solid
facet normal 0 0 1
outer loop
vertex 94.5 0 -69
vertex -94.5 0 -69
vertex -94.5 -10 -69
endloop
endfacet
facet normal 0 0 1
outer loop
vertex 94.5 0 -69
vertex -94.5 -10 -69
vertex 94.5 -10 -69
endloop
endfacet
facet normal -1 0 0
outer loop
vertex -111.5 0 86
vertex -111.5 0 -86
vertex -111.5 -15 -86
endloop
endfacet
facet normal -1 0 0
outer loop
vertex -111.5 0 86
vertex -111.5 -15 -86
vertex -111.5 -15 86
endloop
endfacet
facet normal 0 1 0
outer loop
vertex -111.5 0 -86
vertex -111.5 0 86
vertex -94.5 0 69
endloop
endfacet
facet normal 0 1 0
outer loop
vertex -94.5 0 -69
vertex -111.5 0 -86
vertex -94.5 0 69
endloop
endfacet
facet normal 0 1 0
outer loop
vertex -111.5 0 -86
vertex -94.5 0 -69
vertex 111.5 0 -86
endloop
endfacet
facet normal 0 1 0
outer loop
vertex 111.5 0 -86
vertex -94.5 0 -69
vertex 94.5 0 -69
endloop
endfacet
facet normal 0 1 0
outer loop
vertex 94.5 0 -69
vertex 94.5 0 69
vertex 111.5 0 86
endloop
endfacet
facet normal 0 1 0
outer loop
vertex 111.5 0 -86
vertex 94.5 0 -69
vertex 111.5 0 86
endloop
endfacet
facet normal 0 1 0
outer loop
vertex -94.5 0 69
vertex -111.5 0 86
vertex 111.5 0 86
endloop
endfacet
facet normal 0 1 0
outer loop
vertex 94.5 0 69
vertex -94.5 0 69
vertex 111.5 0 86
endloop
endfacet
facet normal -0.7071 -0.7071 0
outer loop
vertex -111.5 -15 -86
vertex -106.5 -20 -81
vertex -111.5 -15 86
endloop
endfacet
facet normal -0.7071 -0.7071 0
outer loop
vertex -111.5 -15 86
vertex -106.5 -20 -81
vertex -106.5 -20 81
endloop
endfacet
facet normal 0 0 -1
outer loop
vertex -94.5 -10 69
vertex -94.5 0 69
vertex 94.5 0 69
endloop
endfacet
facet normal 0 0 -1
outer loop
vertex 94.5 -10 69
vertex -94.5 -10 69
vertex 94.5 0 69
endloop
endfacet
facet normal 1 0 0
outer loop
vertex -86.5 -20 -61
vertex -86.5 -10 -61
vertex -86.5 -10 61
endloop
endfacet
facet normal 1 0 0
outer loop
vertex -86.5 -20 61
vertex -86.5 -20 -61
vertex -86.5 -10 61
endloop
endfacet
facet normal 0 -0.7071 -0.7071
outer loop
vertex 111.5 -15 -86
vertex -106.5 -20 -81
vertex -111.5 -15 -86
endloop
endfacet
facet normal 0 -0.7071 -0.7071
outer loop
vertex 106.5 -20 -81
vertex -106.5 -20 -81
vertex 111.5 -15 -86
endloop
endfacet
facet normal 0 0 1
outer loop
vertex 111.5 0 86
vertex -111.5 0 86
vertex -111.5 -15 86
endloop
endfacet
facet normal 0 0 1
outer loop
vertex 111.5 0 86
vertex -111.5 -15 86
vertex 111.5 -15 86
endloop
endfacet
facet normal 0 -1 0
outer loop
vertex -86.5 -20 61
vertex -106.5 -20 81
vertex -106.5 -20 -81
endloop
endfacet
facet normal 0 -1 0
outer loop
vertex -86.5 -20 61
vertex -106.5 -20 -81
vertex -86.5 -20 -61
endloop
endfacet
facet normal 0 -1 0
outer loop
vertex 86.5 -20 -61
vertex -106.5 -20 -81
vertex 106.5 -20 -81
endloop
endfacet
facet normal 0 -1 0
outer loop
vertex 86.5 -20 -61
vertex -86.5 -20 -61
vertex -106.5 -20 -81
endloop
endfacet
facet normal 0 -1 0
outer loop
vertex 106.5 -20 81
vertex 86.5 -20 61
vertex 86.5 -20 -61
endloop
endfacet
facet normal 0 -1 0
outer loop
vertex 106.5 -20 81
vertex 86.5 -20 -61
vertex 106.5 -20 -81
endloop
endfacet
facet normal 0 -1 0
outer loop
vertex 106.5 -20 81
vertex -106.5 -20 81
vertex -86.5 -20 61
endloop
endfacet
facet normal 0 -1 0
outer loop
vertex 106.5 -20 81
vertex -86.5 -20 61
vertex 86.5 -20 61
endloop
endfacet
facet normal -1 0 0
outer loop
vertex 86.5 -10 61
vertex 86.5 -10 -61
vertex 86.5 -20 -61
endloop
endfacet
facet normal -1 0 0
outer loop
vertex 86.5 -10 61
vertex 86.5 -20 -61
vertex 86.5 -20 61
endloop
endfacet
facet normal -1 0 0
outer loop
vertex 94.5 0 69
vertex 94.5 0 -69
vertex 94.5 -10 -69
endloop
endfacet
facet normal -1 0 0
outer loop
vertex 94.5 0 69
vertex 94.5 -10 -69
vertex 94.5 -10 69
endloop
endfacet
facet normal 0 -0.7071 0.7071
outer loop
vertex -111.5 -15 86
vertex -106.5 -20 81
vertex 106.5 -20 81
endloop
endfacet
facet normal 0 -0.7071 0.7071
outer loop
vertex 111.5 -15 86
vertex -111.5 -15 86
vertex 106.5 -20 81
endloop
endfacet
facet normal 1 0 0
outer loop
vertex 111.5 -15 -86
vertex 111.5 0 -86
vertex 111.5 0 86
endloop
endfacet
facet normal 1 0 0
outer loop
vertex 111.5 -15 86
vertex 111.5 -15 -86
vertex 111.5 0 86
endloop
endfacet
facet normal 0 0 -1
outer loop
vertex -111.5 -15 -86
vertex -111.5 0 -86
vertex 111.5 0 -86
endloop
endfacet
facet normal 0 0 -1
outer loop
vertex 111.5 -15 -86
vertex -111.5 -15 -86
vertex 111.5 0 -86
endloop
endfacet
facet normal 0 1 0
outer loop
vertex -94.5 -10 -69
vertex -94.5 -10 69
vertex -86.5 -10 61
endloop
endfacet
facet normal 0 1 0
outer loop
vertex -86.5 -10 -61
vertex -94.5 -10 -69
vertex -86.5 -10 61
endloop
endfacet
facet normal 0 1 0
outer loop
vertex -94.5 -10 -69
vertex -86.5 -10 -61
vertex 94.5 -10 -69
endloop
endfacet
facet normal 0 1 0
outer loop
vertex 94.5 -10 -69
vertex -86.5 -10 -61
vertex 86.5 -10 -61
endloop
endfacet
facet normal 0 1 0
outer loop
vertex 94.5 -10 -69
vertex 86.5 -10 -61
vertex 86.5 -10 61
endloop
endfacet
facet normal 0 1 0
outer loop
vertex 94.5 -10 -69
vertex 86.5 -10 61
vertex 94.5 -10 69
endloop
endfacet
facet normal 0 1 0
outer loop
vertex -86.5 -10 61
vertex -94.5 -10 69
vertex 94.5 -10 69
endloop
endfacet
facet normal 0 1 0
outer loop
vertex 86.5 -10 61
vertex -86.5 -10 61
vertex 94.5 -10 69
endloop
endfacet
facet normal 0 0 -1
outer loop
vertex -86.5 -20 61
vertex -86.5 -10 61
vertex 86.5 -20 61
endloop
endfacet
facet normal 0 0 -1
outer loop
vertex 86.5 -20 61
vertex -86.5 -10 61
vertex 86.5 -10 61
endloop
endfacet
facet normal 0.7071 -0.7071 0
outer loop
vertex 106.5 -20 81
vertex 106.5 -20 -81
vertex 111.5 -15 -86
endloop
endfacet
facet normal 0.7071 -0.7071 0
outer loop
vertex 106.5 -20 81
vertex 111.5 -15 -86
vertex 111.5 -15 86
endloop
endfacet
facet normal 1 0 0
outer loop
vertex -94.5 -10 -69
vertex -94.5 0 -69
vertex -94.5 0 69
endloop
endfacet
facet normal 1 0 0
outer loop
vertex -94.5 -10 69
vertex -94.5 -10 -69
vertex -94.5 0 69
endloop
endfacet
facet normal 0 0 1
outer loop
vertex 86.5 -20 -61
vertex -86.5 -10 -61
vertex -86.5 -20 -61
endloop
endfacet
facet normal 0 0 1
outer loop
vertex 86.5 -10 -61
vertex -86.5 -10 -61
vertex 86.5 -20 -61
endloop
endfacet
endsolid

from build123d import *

# Parameters (mm, degrees)
F0_W     = 223
F0_H     = 172
F0_W_2   = 189
F0_H_2   = 138
F0_W_3   = 173
F0_H_3   = 122
F1_DEPTH = 20
F2_SIZE  = 5
F3_DEPTH = 10


# Not quite as in the source:
# - a feature names something its author has since deleted; it is built from what else it names


with BuildPart() as f1:
    # F0 (on Front) → F1 (new body)
    with BuildSketch(Plane.XZ):
        Rectangle(F0_W, F0_H)
        Rectangle(F0_W_2, F0_H_2, mode=Mode.SUBTRACT)
        Rectangle(F0_W_2, F0_H_2)
        Rectangle(F0_W_3, F0_H_3, mode=Mode.SUBTRACT)
    extrude(amount=F1_DEPTH)

    # F2
    f2_edges = [f1.edges().sort_by_distance(p)[0] for p in [
        (-111.5, -20, 0),
        (0, -20, 86),
        (111.5, -20, 0),
        (0, -20, -86),
    ]]
    chamfer(f2_edges, length=F2_SIZE)

    # F0 (on Front) → F3 (cut)
    with BuildSketch(Plane.XZ):
        Rectangle(F0_W_2, F0_H_2)
        Rectangle(F0_W_3, F0_H_3, mode=Mode.SUBTRACT)
    extrude(amount=F3_DEPTH, mode=Mode.SUBTRACT)


solid = f1.part
